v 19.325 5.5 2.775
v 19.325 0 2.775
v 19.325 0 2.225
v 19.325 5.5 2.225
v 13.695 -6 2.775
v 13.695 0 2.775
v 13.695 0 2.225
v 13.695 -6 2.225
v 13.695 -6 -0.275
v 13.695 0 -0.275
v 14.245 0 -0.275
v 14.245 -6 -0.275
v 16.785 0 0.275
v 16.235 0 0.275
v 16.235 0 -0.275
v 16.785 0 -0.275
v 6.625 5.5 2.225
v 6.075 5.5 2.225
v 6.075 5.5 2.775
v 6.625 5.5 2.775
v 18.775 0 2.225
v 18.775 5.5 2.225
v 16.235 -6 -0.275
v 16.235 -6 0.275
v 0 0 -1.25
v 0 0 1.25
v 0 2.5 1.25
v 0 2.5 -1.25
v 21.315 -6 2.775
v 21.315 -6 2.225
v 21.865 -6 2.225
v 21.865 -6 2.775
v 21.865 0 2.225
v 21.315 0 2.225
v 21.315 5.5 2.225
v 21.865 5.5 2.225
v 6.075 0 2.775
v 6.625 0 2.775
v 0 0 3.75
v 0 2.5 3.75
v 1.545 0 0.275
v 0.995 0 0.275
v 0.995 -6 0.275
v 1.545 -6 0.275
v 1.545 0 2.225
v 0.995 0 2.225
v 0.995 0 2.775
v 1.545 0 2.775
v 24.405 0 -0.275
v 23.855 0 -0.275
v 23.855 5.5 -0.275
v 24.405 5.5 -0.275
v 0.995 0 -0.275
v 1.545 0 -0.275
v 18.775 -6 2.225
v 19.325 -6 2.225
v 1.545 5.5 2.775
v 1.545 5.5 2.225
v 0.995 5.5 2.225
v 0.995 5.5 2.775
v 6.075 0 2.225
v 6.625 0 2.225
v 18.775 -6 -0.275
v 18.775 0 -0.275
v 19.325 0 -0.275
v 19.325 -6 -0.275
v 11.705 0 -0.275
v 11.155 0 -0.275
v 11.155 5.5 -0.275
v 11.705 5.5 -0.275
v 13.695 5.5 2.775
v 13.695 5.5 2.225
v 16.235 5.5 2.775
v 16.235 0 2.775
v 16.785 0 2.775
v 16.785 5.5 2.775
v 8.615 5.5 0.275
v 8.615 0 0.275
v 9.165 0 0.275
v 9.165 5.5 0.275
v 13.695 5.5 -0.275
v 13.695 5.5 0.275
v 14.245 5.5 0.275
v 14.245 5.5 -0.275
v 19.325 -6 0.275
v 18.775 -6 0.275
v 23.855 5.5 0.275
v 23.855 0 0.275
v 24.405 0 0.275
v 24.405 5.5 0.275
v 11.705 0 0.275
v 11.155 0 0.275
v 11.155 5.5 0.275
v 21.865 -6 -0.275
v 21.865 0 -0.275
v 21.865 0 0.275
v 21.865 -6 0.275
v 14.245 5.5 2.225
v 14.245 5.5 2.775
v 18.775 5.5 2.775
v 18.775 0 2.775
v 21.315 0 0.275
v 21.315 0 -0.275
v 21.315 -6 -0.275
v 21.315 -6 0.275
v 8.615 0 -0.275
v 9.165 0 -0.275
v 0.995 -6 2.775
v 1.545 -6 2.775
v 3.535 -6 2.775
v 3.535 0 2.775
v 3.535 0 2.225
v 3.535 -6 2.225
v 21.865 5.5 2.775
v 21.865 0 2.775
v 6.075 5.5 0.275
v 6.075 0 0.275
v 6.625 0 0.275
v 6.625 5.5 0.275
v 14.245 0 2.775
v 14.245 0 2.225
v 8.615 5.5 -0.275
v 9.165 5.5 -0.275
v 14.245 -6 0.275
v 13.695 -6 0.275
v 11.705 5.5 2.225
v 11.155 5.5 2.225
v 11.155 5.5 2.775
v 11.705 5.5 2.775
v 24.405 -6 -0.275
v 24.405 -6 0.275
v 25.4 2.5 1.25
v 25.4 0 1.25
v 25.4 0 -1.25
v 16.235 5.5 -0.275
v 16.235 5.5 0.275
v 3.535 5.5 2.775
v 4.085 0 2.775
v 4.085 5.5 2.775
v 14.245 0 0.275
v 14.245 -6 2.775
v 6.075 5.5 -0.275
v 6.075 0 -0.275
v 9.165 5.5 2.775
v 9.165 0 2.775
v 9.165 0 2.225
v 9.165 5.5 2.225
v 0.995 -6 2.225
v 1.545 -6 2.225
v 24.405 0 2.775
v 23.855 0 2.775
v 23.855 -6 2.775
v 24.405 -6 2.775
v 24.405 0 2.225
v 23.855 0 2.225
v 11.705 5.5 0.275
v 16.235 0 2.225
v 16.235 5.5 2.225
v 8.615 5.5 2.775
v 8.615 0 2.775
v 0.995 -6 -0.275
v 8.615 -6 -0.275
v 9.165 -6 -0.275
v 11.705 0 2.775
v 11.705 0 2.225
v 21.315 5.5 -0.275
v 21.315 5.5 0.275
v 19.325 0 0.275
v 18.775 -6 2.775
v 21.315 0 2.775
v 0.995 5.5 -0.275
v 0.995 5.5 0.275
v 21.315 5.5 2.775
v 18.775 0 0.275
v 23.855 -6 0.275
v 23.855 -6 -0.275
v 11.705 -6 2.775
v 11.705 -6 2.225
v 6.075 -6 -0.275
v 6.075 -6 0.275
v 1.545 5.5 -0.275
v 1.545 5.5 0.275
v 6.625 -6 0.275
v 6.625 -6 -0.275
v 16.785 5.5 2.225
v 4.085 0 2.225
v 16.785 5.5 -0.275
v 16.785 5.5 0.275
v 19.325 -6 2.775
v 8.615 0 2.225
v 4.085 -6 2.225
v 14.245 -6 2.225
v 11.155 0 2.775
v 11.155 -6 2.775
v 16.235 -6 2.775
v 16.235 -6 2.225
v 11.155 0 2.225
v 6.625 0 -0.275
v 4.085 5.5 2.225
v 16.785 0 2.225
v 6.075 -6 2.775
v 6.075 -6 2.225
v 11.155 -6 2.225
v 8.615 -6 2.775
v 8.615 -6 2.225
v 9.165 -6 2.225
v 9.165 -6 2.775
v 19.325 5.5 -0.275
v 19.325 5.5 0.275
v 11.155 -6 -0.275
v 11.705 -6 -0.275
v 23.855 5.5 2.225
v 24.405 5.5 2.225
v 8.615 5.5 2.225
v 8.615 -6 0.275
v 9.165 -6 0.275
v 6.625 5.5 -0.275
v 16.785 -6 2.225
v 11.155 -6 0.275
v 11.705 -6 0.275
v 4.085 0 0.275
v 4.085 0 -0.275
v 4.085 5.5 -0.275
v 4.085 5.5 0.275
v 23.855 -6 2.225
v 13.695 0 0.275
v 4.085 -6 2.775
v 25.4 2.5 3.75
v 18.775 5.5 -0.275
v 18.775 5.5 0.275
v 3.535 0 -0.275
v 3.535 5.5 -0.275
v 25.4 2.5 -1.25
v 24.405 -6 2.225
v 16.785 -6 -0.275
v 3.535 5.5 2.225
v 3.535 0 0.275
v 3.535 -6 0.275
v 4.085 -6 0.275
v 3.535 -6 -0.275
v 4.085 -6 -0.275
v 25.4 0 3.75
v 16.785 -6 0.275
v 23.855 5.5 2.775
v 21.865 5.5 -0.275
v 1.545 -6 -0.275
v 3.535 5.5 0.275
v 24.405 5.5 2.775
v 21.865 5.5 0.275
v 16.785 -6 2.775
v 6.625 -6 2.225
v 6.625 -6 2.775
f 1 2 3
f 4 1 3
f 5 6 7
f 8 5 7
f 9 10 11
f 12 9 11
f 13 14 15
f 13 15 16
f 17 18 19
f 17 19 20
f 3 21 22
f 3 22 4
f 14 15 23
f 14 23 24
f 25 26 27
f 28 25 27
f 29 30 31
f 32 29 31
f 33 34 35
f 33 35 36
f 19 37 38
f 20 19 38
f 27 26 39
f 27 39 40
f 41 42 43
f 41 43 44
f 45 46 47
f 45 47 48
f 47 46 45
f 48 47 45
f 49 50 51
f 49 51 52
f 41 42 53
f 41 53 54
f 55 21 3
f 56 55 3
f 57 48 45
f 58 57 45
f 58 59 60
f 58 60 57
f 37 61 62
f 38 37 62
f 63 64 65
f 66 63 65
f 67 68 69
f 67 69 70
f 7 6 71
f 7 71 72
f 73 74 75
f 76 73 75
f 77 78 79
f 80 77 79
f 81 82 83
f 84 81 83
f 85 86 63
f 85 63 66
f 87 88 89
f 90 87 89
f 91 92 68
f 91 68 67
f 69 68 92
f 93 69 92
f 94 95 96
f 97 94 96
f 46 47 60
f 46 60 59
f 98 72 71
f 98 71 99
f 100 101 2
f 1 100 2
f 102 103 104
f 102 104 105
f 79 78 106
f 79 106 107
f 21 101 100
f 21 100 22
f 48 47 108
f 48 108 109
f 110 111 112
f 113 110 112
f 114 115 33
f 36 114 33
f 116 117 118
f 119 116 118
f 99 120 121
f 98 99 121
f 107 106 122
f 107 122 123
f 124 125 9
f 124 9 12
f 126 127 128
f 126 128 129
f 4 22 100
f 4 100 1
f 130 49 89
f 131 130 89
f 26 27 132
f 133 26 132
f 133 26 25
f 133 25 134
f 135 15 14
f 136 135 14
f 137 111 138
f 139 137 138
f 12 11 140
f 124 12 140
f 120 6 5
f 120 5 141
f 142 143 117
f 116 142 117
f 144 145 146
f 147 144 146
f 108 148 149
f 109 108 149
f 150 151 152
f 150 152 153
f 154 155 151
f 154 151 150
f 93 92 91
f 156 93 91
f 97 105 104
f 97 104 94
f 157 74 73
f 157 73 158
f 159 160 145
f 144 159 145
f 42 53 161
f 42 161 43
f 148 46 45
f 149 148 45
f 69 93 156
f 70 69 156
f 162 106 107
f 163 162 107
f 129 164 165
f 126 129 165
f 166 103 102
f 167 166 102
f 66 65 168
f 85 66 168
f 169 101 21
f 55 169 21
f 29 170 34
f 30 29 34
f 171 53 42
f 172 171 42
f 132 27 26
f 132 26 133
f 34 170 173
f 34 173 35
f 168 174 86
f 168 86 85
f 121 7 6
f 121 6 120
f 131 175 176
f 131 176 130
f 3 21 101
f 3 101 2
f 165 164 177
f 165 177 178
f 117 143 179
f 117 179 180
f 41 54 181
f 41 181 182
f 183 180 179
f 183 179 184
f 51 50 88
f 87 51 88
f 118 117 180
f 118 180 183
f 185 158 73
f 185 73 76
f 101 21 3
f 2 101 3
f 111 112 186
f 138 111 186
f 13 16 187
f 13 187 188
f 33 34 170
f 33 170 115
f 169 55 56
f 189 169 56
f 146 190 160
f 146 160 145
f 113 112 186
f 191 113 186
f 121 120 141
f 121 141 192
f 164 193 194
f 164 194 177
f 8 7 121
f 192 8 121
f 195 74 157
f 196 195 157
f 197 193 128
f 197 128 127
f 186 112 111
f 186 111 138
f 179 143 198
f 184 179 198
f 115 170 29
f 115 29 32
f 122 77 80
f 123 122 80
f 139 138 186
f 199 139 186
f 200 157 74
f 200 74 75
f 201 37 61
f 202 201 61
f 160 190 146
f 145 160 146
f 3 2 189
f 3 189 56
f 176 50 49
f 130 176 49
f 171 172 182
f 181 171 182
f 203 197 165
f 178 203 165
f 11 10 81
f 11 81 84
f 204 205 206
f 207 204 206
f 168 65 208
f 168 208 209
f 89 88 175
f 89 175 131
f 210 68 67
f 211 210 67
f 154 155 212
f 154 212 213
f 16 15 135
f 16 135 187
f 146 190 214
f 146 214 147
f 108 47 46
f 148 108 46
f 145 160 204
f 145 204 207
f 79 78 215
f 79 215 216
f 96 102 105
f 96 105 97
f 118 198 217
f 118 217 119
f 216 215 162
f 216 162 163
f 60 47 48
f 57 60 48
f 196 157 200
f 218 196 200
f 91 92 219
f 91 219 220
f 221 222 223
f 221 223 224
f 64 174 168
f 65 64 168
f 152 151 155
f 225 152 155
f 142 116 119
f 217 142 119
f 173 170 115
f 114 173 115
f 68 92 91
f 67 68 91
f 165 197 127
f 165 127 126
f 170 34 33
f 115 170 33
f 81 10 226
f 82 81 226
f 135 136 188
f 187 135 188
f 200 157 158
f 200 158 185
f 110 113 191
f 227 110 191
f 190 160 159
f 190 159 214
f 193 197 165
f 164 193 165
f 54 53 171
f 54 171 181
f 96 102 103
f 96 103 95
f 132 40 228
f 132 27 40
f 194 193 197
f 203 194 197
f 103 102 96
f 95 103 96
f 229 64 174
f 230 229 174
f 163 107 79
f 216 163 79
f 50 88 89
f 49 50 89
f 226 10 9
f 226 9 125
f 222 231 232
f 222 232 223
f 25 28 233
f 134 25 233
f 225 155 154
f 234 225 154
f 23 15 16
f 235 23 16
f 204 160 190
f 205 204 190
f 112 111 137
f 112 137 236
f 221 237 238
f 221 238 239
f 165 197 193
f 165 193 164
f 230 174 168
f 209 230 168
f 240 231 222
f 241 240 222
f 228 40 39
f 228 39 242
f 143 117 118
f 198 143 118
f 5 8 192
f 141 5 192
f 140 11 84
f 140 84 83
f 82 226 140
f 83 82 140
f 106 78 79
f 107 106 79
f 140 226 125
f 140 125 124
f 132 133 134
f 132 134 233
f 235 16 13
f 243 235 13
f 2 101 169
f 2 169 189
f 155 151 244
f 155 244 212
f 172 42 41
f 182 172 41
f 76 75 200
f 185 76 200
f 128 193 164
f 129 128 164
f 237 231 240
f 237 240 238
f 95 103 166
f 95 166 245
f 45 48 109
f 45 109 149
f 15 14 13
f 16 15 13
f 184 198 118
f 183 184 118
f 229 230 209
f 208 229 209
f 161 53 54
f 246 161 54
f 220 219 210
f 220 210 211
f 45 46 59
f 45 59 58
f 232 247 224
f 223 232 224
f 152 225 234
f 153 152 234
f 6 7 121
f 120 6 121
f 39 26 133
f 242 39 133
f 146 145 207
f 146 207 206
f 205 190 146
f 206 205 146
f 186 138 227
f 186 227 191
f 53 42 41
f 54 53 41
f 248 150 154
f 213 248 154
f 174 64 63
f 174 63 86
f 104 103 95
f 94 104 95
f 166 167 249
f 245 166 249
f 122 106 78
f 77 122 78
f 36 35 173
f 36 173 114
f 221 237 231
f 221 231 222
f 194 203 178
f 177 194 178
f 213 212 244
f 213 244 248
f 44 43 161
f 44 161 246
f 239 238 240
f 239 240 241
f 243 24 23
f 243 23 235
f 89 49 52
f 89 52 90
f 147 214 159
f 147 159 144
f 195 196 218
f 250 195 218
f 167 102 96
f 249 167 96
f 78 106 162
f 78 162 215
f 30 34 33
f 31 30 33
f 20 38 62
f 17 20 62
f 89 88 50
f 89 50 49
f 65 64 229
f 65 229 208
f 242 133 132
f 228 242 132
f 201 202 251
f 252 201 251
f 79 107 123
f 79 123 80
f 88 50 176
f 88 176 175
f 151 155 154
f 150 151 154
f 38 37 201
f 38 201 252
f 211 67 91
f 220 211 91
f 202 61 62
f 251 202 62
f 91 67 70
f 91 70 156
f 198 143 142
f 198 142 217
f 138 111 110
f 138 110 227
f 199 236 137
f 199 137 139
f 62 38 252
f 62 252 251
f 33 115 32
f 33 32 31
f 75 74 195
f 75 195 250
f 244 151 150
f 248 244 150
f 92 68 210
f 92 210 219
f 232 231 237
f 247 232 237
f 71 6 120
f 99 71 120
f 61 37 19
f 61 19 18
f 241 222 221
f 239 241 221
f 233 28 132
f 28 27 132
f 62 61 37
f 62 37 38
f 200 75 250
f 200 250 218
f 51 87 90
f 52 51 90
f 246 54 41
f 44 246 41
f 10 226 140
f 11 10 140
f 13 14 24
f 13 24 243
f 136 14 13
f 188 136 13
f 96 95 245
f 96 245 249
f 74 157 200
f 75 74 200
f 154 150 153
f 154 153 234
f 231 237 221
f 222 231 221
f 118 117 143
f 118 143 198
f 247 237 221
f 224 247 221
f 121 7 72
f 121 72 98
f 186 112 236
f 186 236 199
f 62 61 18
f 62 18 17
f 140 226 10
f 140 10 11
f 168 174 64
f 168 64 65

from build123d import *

# Parameters (mm, degrees)
SKETCH1_W              = 25.4
SKETCH1_H              = 2.5
BOSS_EXTRUDE1_DEPTH    = 1.25
SKETCH2_W              = 0.55
SKETCH2_H              = 0.55
BOSS_EXTRUDE2_DEPTH    = 6
BOSS_EXTRUDE2_2_DEPTH  = 6
BOSS_EXTRUDE2_3_DEPTH  = 6
BOSS_EXTRUDE2_4_DEPTH  = 6
BOSS_EXTRUDE2_5_DEPTH  = 6
BOSS_EXTRUDE2_6_DEPTH  = 6
BOSS_EXTRUDE2_7_DEPTH  = 6
BOSS_EXTRUDE2_8_DEPTH  = 6
BOSS_EXTRUDE2_9_DEPTH  = 6
BOSS_EXTRUDE2_10_DEPTH = 6
SKETCH2_2_W            = 0.55
SKETCH2_2_H            = 0.55
BOSS_EXTRUDE3_DEPTH    = 5.5
BOSS_EXTRUDE3_2_DEPTH  = 5.5
BOSS_EXTRUDE3_3_DEPTH  = 5.5
BOSS_EXTRUDE3_4_DEPTH  = 5.5
BOSS_EXTRUDE3_5_DEPTH  = 5.5
BOSS_EXTRUDE3_6_DEPTH  = 5.5
BOSS_EXTRUDE3_7_DEPTH  = 5.5
BOSS_EXTRUDE3_8_DEPTH  = 5.5
BOSS_EXTRUDE3_9_DEPTH  = 5.5
BOSS_EXTRUDE3_10_DEPTH = 5.5


with BuildPart() as part:
    # Sketch1 → Boss-Extrude1 (new, symmetric)
    with BuildSketch(Plane.XY):
        with Locations((12.7, 1.25)):
            Rectangle(SKETCH1_W, SKETCH1_H)
    extrude(amount=BOSS_EXTRUDE1_DEPTH, both=True)


with BuildPart() as body_2:
    # Sketch2 → Boss-Extrude2 (new body)
    with BuildSketch(Plane.XZ):
        with Locations((3.81, 0)):
            Rectangle(SKETCH2_W, SKETCH2_H)
    extrude(amount=BOSS_EXTRUDE2_DEPTH)


with BuildPart() as body_3:
    # Sketch2 → Boss-Extrude2 2 (new body)
    with BuildSketch(Plane.XZ):
        with Locations((1.27, 0)):
            Rectangle(SKETCH2_W, SKETCH2_H)
    extrude(amount=BOSS_EXTRUDE2_2_DEPTH)


with BuildPart() as body_4:
    # Sketch2 → Boss-Extrude2 3 (new body)
    with BuildSketch(Plane.XZ):
        with Locations((6.35, 0)):
            Rectangle(SKETCH2_W, SKETCH2_H)
    extrude(amount=BOSS_EXTRUDE2_3_DEPTH)


with BuildPart() as body_5:
    # Sketch2 → Boss-Extrude2 4 (new body)
    with BuildSketch(Plane.XZ):
        with Locations((8.89, 0)):
            Rectangle(SKETCH2_W, SKETCH2_H)
    extrude(amount=BOSS_EXTRUDE2_4_DEPTH)


with BuildPart() as body_6:
    # Sketch2 → Boss-Extrude2 5 (new body)
    with BuildSketch(Plane.XZ):
        with Locations((11.43, 0)):
            Rectangle(SKETCH2_W, SKETCH2_H)
    extrude(amount=BOSS_EXTRUDE2_5_DEPTH)


with BuildPart() as body_7:
    # Sketch2 → Boss-Extrude2 6 (new body)
    with BuildSketch(Plane.XZ):
        with Locations((13.97, 0)):
            Rectangle(SKETCH2_W, SKETCH2_H)
    extrude(amount=BOSS_EXTRUDE2_6_DEPTH)


with BuildPart() as body_8:
    # Sketch2 → Boss-Extrude2 7 (new body)
    with BuildSketch(Plane.XZ):
        with Locations((16.51, 0)):
            Rectangle(SKETCH2_W, SKETCH2_H)
    extrude(amount=BOSS_EXTRUDE2_7_DEPTH)


with BuildPart() as body_9:
    # Sketch2 → Boss-Extrude2 8 (new body)
    with BuildSketch(Plane.XZ):
        with Locations((19.05, 0)):
            Rectangle(SKETCH2_W, SKETCH2_H)
    extrude(amount=BOSS_EXTRUDE2_8_DEPTH)


with BuildPart() as body_10:
    # Sketch2 → Boss-Extrude2 9 (new body)
    with BuildSketch(Plane.XZ):
        with Locations((21.59, 0)):
            Rectangle(SKETCH2_W, SKETCH2_H)
    extrude(amount=BOSS_EXTRUDE2_9_DEPTH)


with BuildPart() as body_11:
    # Sketch2 → Boss-Extrude2 10 (new body)
    with BuildSketch(Plane.XZ):
        with Locations((24.13, 0)):
            Rectangle(SKETCH2_W, SKETCH2_H)
    extrude(amount=BOSS_EXTRUDE2_10_DEPTH)


with BuildPart() as body_12:
    # Sketch2<2> → Boss-Extrude3 (new body)
    with BuildSketch(Plane.XZ):
        with Locations((3.81, 0)):
            Rectangle(SKETCH2_2_W, SKETCH2_2_H)
    extrude(amount=-BOSS_EXTRUDE3_DEPTH)


with BuildPart() as body_13:
    # Sketch2<2> → Boss-Extrude3 2 (new body)
    with BuildSketch(Plane.XZ):
        with Locations((1.27, 0)):
            Rectangle(SKETCH2_2_W, SKETCH2_2_H)
    extrude(amount=-BOSS_EXTRUDE3_2_DEPTH)


with BuildPart() as body_14:
    # Sketch2<2> → Boss-Extrude3 3 (new body)
    with BuildSketch(Plane.XZ):
        with Locations((6.35, 0)):
            Rectangle(SKETCH2_2_W, SKETCH2_2_H)
    extrude(amount=-BOSS_EXTRUDE3_3_DEPTH)


with BuildPart() as body_15:
    # Sketch2<2> → Boss-Extrude3 4 (new body)
    with BuildSketch(Plane.XZ):
        with Locations((8.89, 0)):
            Rectangle(SKETCH2_2_W, SKETCH2_2_H)
    extrude(amount=-BOSS_EXTRUDE3_4_DEPTH)


with BuildPart() as body_16:
    # Sketch2<2> → Boss-Extrude3 5 (new body)
    with BuildSketch(Plane.XZ):
        with Locations((11.43, 0)):
            Rectangle(SKETCH2_2_W, SKETCH2_2_H)
    extrude(amount=-BOSS_EXTRUDE3_5_DEPTH)


with BuildPart() as body_17:
    # Sketch2<2> → Boss-Extrude3 6 (new body)
    with BuildSketch(Plane.XZ):
        with Locations((13.97, 0)):
            Rectangle(SKETCH2_2_W, SKETCH2_2_H)
    extrude(amount=-BOSS_EXTRUDE3_6_DEPTH)


with BuildPart() as body_18:
    # Sketch2<2> → Boss-Extrude3 7 (new body)
    with BuildSketch(Plane.XZ):
        with Locations((16.51, 0)):
            Rectangle(SKETCH2_2_W, SKETCH2_2_H)
    extrude(amount=-BOSS_EXTRUDE3_7_DEPTH)


with BuildPart() as body_19:
    # Sketch2<2> → Boss-Extrude3 8 (new body)
    with BuildSketch(Plane.XZ):
        with Locations((19.05, 0)):
            Rectangle(SKETCH2_2_W, SKETCH2_2_H)
    extrude(amount=-BOSS_EXTRUDE3_8_DEPTH)


with BuildPart() as body_20:
    # Sketch2<2> → Boss-Extrude3 9 (new body)
    with BuildSketch(Plane.XZ):
        with Locations((21.59, 0)):
            Rectangle(SKETCH2_2_W, SKETCH2_2_H)
    extrude(amount=-BOSS_EXTRUDE3_9_DEPTH)


with BuildPart() as body_21:
    # Sketch2<2> → Boss-Extrude3 10 (new body)
    with BuildSketch(Plane.XZ):
        with Locations((24.13, 0)):
            Rectangle(SKETCH2_2_W, SKETCH2_2_H)
    extrude(amount=-BOSS_EXTRUDE3_10_DEPTH)


with BuildPart() as body_22:
    # Mirror1: mirrored copy
    add(part.part.mirror(Plane(origin=(0, 0, 1.25), x_dir=(1, 0, 0), z_dir=(0, 0, -1))))


with BuildPart() as body_23:
    # Mirror1 2: mirrored copy
    add(body_13.part.mirror(Plane(origin=(0, 0, 1.25), x_dir=(1, 0, 0), z_dir=(0, 0, -1))))


with BuildPart() as body_24:
    # Mirror1 3: mirrored copy
    add(body_12.part.mirror(Plane(origin=(0, 0, 1.25), x_dir=(1, 0, 0), z_dir=(0, 0, -1))))


with BuildPart() as body_25:
    # Mirror1 4: mirrored copy
    add(body_14.part.mirror(Plane(origin=(0, 0, 1.25), x_dir=(1, 0, 0), z_dir=(0, 0, -1))))


with BuildPart() as body_26:
    # Mirror1 5: mirrored copy
    add(body_15.part.mirror(Plane(origin=(0, 0, 1.25), x_dir=(1, 0, 0), z_dir=(0, 0, -1))))


with BuildPart() as body_27:
    # Mirror1 6: mirrored copy
    add(body_16.part.mirror(Plane(origin=(0, 0, 1.25), x_dir=(1, 0, 0), z_dir=(0, 0, -1))))


with BuildPart() as body_28:
    # Mirror1 7: mirrored copy
    add(body_17.part.mirror(Plane(origin=(0, 0, 1.25), x_dir=(1, 0, 0), z_dir=(0, 0, -1))))


with BuildPart() as body_29:
    # Mirror1 8: mirrored copy
    add(body_18.part.mirror(Plane(origin=(0, 0, 1.25), x_dir=(1, 0, 0), z_dir=(0, 0, -1))))


with BuildPart() as body_30:
    # Mirror1 9: mirrored copy
    add(body_19.part.mirror(Plane(origin=(0, 0, 1.25), x_dir=(1, 0, 0), z_dir=(0, 0, -1))))


with BuildPart() as body_31:
    # Mirror1 10: mirrored copy
    add(body_20.part.mirror(Plane(origin=(0, 0, 1.25), x_dir=(1, 0, 0), z_dir=(0, 0, -1))))


with BuildPart() as body_32:
    # Mirror1 11: mirrored copy
    add(body_21.part.mirror(Plane(origin=(0, 0, 1.25), x_dir=(1, 0, 0), z_dir=(0, 0, -1))))


with BuildPart() as body_33:
    # Mirror1 12: mirrored copy
    add(body_11.part.mirror(Plane(origin=(0, 0, 1.25), x_dir=(1, 0, 0), z_dir=(0, 0, -1))))


with BuildPart() as body_34:
    # Mirror1 13: mirrored copy
    add(body_10.part.mirror(Plane(origin=(0, 0, 1.25), x_dir=(1, 0, 0), z_dir=(0, 0, -1))))


with BuildPart() as body_35:
    # Mirror1 14: mirrored copy
    add(body_9.part.mirror(Plane(origin=(0, 0, 1.25), x_dir=(1, 0, 0), z_dir=(0, 0, -1))))


with BuildPart() as body_36:
    # Mirror1 15: mirrored copy
    add(body_8.part.mirror(Plane(origin=(0, 0, 1.25), x_dir=(1, 0, 0), z_dir=(0, 0, -1))))


with BuildPart() as body_37:
    # Mirror1 16: mirrored copy
    add(body_7.part.mirror(Plane(origin=(0, 0, 1.25), x_dir=(1, 0, 0), z_dir=(0, 0, -1))))


with BuildPart() as body_38:
    # Mirror1 17: mirrored copy
    add(body_6.part.mirror(Plane(origin=(0, 0, 1.25), x_dir=(1, 0, 0), z_dir=(0, 0, -1))))


with BuildPart() as body_39:
    # Mirror1 18: mirrored copy
    add(body_5.part.mirror(Plane(origin=(0, 0, 1.25), x_dir=(1, 0, 0), z_dir=(0, 0, -1))))


with BuildPart() as body_40:
    # Mirror1 19: mirrored copy
    add(body_4.part.mirror(Plane(origin=(0, 0, 1.25), x_dir=(1, 0, 0), z_dir=(0, 0, -1))))


with BuildPart() as body_41:
    # Mirror1 20: mirrored copy
    add(body_2.part.mirror(Plane(origin=(0, 0, 1.25), x_dir=(1, 0, 0), z_dir=(0, 0, -1))))


with BuildPart() as body_42:
    # Mirror1 21: mirrored copy
    add(body_3.part.mirror(Plane(origin=(0, 0, 1.25), x_dir=(1, 0, 0), z_dir=(0, 0, -1))))


solid = Compound([part.part, body_2.part, body_3.part, body_4.part, body_5.part, body_6.part, body_7.part, body_8.part, body_9.part, body_10.part, body_11.part, body_12.part, body_13.part, body_14.part, body_15.part, body_16.part, body_17.part, body_18.part, body_19.part, body_20.part, body_21.part, body_22.part, body_23.part, body_24.part, body_25.part, body_26.part, body_27.part, body_28.part, body_29.part, body_30.part, body_31.part, body_32.part, body_33.part, body_34.part, body_35.part, body_36.part, body_37.part, body_38.part, body_39.part, body_40.part, body_41.part, body_42.part])
